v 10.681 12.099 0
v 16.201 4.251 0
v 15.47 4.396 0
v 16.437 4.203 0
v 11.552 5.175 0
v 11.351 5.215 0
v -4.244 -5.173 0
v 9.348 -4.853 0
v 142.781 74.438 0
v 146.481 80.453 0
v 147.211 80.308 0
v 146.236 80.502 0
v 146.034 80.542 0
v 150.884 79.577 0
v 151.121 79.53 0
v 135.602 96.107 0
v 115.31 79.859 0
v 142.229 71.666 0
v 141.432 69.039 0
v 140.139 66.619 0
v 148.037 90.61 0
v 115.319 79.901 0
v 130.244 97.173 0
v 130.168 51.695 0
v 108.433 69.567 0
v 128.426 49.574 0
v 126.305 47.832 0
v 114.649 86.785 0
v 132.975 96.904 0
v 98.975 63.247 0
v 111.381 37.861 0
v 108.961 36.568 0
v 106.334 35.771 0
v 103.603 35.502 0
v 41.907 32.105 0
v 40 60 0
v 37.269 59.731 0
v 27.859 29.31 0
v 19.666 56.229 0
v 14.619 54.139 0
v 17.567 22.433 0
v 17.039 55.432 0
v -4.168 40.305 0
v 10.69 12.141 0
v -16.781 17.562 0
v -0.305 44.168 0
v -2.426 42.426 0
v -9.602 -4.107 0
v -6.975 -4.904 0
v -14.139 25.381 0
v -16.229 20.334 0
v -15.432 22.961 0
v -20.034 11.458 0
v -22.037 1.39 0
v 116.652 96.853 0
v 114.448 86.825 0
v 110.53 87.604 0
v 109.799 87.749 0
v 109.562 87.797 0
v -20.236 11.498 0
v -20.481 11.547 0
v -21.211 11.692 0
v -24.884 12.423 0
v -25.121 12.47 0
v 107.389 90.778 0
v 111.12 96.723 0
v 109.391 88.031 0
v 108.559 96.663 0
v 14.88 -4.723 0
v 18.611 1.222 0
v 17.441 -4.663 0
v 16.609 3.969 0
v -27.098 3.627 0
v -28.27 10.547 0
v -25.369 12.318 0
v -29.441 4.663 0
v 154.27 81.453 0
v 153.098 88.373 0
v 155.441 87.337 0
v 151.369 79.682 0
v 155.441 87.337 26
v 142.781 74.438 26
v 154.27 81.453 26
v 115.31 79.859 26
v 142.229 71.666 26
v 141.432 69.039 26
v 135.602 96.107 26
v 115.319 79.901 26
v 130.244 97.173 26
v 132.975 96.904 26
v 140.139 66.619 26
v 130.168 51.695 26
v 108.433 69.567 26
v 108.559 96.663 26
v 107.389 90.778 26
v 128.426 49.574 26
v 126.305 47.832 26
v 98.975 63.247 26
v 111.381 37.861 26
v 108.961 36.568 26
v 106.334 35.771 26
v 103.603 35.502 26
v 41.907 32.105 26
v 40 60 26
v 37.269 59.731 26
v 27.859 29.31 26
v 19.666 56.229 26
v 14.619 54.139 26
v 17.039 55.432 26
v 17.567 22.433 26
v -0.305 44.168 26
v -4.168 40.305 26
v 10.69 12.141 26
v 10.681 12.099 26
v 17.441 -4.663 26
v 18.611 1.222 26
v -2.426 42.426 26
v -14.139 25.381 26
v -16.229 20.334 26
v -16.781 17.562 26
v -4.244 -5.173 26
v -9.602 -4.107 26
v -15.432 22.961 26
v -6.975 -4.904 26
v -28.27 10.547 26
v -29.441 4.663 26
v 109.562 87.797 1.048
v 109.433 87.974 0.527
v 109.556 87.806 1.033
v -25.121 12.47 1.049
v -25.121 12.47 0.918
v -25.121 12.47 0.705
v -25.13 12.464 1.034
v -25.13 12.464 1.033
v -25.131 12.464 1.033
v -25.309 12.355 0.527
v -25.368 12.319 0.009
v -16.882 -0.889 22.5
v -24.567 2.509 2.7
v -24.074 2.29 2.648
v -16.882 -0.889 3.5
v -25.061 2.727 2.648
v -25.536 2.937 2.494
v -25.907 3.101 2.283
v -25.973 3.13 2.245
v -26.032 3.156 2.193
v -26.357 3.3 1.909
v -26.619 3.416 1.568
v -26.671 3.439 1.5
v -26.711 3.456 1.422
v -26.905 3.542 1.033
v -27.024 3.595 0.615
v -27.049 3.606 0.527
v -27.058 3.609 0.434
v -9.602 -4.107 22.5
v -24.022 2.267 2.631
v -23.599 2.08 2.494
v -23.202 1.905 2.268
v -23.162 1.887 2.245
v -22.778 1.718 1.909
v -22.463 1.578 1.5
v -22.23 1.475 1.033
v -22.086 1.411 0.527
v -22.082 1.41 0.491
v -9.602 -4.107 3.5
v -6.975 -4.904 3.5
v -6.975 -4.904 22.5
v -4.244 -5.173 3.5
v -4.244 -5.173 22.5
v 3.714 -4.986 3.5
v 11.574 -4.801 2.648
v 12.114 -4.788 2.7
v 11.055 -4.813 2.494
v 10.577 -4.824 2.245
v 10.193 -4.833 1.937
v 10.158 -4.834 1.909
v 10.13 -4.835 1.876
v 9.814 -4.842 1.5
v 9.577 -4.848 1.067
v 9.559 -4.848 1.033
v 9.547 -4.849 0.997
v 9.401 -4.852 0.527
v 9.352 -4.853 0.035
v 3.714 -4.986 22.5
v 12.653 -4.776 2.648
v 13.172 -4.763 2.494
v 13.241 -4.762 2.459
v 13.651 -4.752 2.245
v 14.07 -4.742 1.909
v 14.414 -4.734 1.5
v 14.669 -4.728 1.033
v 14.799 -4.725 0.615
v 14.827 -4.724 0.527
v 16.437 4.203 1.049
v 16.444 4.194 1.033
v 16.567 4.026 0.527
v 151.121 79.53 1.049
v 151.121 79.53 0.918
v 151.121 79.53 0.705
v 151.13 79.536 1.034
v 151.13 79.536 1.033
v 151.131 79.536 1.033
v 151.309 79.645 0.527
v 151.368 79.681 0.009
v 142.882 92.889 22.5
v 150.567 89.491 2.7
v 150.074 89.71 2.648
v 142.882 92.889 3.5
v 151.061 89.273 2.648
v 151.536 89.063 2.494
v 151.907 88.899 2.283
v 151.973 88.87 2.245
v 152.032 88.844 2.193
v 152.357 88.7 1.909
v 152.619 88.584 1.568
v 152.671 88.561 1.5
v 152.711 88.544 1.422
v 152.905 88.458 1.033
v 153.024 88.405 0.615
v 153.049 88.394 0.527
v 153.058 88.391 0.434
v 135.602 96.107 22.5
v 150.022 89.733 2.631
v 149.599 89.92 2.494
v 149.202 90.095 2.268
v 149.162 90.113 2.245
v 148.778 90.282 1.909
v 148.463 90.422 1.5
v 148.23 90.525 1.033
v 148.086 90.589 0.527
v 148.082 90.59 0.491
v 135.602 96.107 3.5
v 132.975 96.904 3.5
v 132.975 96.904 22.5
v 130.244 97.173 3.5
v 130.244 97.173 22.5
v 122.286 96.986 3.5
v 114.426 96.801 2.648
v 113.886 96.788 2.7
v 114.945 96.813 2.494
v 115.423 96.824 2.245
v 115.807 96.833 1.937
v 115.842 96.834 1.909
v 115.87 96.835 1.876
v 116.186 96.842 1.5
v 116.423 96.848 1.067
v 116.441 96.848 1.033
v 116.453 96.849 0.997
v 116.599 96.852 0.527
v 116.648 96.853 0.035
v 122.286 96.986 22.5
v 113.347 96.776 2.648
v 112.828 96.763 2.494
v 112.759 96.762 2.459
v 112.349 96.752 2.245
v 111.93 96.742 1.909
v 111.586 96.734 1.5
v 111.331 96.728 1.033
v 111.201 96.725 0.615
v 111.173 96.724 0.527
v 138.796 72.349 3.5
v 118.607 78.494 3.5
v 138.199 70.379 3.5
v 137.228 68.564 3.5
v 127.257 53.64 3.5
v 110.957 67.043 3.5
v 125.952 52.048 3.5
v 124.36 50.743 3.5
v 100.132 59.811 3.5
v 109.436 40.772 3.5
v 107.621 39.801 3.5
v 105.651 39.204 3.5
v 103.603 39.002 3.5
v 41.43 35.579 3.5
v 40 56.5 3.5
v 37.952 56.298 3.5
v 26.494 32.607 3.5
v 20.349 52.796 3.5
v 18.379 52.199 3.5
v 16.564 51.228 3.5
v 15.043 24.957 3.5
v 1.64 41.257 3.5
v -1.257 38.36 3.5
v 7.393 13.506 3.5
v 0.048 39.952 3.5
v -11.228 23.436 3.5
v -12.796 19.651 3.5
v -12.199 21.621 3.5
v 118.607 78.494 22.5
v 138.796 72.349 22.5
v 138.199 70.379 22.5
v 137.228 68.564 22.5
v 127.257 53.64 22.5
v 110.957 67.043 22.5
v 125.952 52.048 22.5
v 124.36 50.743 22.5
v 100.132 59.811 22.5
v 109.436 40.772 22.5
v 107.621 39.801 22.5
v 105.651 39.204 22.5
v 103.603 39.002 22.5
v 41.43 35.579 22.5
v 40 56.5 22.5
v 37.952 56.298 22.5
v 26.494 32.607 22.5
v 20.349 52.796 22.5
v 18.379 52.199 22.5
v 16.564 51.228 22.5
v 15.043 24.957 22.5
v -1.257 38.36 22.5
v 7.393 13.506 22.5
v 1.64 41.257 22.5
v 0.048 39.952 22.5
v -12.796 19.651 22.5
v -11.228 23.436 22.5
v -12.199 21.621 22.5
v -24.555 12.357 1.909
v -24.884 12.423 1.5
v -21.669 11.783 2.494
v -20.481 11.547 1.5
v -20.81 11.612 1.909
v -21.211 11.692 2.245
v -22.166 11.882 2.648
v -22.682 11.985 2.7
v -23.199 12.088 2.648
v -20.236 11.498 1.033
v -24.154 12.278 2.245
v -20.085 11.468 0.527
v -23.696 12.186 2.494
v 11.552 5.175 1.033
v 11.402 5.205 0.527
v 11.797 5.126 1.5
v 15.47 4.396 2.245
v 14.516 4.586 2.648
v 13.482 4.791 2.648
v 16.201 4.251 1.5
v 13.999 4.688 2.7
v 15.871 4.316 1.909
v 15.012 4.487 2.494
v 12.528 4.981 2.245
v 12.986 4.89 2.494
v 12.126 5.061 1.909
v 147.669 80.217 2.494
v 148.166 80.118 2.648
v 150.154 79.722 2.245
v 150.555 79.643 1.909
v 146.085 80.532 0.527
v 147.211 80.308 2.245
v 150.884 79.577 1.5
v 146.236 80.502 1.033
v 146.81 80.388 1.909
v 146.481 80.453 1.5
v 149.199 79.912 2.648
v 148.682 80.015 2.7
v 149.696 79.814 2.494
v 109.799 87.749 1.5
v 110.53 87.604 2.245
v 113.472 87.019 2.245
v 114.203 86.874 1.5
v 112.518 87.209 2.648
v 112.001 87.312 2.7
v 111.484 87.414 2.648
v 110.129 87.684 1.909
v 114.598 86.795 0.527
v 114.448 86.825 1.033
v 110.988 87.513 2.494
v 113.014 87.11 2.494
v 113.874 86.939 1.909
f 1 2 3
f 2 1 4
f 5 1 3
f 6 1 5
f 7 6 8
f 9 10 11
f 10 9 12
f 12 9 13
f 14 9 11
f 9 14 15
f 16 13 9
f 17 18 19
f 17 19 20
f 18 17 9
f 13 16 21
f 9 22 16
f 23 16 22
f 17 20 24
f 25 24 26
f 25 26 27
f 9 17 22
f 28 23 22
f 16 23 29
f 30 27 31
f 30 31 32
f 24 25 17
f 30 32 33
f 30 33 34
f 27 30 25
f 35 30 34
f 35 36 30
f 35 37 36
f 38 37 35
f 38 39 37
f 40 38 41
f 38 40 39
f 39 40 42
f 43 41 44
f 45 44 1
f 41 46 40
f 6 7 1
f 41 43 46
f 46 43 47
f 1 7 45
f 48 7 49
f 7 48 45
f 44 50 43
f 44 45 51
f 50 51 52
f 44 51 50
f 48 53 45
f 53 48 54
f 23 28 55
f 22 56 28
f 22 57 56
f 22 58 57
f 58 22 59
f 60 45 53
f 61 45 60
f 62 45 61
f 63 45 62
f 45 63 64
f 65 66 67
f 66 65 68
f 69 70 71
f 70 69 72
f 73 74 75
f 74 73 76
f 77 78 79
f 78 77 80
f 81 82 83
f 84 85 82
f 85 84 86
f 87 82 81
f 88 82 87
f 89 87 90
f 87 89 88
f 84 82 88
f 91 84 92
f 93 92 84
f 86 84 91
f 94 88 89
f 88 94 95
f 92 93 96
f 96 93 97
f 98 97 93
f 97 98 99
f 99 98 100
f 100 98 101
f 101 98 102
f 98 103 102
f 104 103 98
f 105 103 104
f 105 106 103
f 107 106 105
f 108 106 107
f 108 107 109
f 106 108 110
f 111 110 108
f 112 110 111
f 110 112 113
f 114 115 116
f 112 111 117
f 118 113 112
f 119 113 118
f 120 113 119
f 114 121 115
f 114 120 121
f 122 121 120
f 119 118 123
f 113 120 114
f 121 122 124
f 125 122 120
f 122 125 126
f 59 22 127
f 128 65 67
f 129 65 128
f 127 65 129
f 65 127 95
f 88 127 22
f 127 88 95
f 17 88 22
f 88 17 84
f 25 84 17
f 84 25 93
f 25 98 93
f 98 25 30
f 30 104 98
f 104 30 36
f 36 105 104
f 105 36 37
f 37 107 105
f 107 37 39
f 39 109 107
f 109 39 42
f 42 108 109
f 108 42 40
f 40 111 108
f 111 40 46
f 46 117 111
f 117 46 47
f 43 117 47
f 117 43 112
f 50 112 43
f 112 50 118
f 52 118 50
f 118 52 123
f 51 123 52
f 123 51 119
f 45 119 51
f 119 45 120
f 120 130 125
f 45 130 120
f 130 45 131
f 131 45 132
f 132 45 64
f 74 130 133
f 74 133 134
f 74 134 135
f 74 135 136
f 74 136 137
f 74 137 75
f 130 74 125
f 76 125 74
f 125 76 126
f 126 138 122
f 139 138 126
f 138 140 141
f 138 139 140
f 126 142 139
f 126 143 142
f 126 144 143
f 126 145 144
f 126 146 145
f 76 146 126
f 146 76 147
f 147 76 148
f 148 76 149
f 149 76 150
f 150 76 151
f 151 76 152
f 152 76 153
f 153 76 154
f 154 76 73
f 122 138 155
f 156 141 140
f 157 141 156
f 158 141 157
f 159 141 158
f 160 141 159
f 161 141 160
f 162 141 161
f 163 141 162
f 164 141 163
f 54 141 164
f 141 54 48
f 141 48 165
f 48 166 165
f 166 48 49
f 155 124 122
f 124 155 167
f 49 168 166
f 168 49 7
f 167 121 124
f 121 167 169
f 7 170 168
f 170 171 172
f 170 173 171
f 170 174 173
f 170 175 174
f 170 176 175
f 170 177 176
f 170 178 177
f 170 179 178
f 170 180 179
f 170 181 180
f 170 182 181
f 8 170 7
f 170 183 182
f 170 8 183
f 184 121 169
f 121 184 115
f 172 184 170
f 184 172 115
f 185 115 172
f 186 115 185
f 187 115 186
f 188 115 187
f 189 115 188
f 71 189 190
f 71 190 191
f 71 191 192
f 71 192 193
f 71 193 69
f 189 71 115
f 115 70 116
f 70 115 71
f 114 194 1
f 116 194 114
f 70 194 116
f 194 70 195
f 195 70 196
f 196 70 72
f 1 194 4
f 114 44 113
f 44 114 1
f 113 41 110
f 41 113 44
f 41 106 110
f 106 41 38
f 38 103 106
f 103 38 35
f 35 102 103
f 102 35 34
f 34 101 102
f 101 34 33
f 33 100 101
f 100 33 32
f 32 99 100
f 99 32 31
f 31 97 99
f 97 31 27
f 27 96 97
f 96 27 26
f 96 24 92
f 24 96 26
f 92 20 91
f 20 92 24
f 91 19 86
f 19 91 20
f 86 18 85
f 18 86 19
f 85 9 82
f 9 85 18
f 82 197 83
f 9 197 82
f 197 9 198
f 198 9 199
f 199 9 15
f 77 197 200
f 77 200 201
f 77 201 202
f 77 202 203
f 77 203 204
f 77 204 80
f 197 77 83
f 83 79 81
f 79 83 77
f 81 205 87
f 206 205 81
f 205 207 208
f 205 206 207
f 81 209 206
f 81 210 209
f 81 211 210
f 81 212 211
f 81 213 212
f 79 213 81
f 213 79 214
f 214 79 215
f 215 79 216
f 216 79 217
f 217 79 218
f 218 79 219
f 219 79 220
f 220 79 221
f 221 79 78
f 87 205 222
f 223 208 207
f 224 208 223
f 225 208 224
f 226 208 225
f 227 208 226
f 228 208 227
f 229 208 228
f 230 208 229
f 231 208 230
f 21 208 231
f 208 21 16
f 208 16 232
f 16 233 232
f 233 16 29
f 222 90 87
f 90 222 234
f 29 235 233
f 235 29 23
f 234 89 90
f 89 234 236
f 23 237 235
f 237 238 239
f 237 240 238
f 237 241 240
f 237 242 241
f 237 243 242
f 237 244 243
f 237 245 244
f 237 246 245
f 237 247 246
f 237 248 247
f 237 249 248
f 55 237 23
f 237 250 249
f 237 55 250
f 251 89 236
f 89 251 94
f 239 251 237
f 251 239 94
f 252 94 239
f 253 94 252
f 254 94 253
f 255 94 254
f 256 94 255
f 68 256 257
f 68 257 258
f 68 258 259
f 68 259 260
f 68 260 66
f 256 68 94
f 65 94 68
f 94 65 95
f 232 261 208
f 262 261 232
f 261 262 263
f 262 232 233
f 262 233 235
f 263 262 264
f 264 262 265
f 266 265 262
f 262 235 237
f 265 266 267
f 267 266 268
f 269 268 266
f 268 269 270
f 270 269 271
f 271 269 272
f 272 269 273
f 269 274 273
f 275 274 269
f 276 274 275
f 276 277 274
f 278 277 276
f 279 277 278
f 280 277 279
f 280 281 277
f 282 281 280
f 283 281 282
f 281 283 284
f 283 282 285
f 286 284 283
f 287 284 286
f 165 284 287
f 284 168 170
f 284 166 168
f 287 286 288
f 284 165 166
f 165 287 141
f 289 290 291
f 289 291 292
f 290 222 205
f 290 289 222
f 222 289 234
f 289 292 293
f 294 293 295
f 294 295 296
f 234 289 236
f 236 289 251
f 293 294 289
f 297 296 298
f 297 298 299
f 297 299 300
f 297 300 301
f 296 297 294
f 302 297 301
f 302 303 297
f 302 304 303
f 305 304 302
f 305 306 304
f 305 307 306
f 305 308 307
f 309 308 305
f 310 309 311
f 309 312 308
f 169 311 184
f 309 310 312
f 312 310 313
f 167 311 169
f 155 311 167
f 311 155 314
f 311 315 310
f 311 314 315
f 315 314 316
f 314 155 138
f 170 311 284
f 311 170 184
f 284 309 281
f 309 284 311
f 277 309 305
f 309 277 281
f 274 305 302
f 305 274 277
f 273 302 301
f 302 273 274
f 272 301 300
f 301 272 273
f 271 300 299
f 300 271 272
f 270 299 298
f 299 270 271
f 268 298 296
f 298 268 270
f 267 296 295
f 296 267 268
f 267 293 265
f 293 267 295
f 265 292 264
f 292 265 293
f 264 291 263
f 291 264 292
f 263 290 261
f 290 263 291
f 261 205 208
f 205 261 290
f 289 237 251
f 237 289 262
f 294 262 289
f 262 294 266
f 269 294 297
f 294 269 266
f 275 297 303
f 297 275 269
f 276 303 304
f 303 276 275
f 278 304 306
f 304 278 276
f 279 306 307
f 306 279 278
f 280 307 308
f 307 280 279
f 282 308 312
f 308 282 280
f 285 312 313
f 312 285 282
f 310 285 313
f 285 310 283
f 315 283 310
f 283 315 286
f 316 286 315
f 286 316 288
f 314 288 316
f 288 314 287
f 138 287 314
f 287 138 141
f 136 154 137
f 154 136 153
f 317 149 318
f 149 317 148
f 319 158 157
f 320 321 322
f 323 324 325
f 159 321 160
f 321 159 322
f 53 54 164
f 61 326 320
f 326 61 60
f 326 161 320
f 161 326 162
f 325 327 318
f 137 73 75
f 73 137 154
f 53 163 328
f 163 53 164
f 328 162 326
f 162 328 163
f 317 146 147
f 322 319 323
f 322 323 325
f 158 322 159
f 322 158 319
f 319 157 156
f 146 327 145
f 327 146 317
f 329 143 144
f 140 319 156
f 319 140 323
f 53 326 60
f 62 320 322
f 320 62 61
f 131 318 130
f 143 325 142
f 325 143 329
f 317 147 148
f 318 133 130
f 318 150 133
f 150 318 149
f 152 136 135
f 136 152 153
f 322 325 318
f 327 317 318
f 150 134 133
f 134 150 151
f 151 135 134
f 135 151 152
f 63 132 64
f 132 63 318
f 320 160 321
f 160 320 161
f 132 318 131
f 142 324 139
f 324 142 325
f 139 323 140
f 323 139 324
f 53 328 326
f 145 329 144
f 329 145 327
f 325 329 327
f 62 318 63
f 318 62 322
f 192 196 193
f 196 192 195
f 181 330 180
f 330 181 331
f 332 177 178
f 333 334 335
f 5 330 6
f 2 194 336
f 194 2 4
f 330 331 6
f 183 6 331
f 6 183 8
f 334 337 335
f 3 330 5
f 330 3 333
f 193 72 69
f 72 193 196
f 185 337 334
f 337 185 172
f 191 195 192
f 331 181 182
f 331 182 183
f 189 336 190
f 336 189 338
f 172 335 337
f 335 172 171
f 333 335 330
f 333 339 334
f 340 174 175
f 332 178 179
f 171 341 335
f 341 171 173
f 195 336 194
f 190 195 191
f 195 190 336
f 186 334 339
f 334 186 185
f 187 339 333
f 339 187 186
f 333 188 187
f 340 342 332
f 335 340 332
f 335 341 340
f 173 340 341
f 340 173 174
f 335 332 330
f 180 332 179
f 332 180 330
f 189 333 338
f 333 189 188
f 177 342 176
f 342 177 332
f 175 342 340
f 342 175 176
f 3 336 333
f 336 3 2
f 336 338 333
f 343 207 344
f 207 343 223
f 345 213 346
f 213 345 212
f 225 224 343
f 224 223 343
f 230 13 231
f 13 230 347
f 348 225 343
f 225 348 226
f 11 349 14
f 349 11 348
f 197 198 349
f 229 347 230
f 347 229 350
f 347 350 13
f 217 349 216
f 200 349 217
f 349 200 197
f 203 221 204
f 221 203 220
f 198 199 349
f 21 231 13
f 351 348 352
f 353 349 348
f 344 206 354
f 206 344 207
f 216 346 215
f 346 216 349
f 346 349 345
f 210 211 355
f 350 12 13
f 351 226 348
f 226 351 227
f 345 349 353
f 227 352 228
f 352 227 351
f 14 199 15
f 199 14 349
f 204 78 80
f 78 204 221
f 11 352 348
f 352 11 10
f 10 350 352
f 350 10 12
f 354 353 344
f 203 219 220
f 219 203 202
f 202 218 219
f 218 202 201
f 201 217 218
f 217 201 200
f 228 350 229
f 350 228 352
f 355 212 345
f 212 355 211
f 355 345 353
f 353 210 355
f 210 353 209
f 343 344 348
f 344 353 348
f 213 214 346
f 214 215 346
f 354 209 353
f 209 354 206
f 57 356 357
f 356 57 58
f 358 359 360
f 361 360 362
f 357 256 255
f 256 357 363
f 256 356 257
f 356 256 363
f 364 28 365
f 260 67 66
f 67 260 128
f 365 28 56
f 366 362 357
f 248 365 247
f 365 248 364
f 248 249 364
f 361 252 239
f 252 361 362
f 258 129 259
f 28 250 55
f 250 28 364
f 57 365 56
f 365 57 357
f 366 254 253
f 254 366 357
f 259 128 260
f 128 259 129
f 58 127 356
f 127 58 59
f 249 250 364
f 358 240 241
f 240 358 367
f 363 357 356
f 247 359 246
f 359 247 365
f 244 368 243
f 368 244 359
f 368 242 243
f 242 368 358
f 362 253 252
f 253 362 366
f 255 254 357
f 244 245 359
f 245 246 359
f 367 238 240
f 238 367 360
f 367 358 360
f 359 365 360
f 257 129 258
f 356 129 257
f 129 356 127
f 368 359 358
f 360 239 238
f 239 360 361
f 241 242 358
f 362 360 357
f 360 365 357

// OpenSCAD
$fn = 32;

// ----------------------------------------------------------------------
// Air duct: 28 mm duct, 3.5 mm wall, 26 mm across
// ----------------------------------------------------------------------

// --- parameters (mm) ---
duct_r = 14;              // duct core radius
duct_d = 28;              // duct core diameter
wall = 3.5;               // duct wall thickness
height = 26;              // duct width (extrusion height)
port_r = 23.9;            // port flange half width
port_d = 47.8;            // port flange width
port_t = 6;               // port flange thickness
bolt_d = 5.4;             // port bolt holes
bolt_offset = 18.7;       // bolt hole offset from the port axis

difference() {
  /* outer hull chain: tube with a flat flange plate at every port */
  linear_extrude(height = 26) {
    hull() {
      polygon([[17.441, -4.663], [-29.441, 4.663], [-28.27, 10.547], [18.611, 1.222]]);
      translate([-4.244, 8.827]) circle(r = 14);
    }
    hull() {
      translate([-4.244, 8.827]) circle(r = 14);
      translate([-2.498, 17.603]) circle(r = 14);
    }
    hull() {
      translate([-2.498, 17.603]) circle(r = 14);
      translate([7.473, 32.527]) circle(r = 14);
    }
    hull() {
      translate([7.473, 32.527]) circle(r = 14);
      translate([22.397, 42.498]) circle(r = 14);
    }
    hull() {
      translate([22.397, 42.498]) circle(r = 14);
      translate([40, 46]) circle(r = 14);
    }
    hull() {
      translate([40, 46]) circle(r = 14);
      translate([103.603, 49.502]) circle(r = 14);
    }
    hull() {
      translate([103.603, 49.502]) circle(r = 14);
      translate([118.527, 59.473]) circle(r = 14);
    }
    hull() {
      translate([118.527, 59.473]) circle(r = 14);
      translate([128.498, 74.397]) circle(r = 14);
    }
    hull() {
      translate([128.498, 74.397]) circle(r = 14);
      translate([130.244, 83.173]) circle(r = 14);
    }
    hull() {
      translate([130.244, 83.173]) circle(r = 14);
      polygon([[108.559, 96.663], [155.441, 87.337], [154.27, 81.453], [107.389, 90.778]]);
    }
  }
  /* air passage: the same chain inset by the wall, 5 mm proud of the ports */
  translate([0, 0, 3.5]) linear_extrude(height = 19) {
    hull() {
      translate([-6.975, -4.904]) circle(r = 10.5);
      translate([-2.498, 17.603]) circle(r = 10.5);
    }
    hull() {
      translate([-2.498, 17.603]) circle(r = 10.5);
      translate([7.473, 32.527]) circle(r = 10.5);
    }
    hull() {
      translate([7.473, 32.527]) circle(r = 10.5);
      translate([22.397, 42.498]) circle(r = 10.5);
    }
    hull() {
      translate([22.397, 42.498]) circle(r = 10.5);
      translate([40, 46]) circle(r = 10.5);
    }
    hull() {
      translate([40, 46]) circle(r = 10.5);
      translate([103.603, 49.502]) circle(r = 10.5);
    }
    hull() {
      translate([103.603, 49.502]) circle(r = 10.5);
      translate([118.527, 59.473]) circle(r = 10.5);
    }
    hull() {
      translate([118.527, 59.473]) circle(r = 10.5);
      translate([128.498, 74.397]) circle(r = 10.5);
    }
    hull() {
      translate([128.498, 74.397]) circle(r = 10.5);
      translate([132.975, 96.904]) circle(r = 10.5);
    }
  }
  translate([-6, 0]) rotate([0, 0, -11.25]) translate([-18.7, -2.5]) rotate([-90, 0, 0]) cylinder(h = 11, d = 5.4);
  translate([-6, 0]) rotate([0, 0, -11.25]) translate([18.7, -2.5]) rotate([-90, 0, 0]) cylinder(h = 11, d = 5.4);
  translate([132, 92]) rotate([0, 0, 168.75]) translate([-18.7, -2.5]) rotate([-90, 0, 0]) cylinder(h = 11, d = 5.4);
  translate([132, 92]) rotate([0, 0, 168.75]) translate([18.7, -2.5]) rotate([-90, 0, 0]) cylinder(h = 11, d = 5.4);
}
